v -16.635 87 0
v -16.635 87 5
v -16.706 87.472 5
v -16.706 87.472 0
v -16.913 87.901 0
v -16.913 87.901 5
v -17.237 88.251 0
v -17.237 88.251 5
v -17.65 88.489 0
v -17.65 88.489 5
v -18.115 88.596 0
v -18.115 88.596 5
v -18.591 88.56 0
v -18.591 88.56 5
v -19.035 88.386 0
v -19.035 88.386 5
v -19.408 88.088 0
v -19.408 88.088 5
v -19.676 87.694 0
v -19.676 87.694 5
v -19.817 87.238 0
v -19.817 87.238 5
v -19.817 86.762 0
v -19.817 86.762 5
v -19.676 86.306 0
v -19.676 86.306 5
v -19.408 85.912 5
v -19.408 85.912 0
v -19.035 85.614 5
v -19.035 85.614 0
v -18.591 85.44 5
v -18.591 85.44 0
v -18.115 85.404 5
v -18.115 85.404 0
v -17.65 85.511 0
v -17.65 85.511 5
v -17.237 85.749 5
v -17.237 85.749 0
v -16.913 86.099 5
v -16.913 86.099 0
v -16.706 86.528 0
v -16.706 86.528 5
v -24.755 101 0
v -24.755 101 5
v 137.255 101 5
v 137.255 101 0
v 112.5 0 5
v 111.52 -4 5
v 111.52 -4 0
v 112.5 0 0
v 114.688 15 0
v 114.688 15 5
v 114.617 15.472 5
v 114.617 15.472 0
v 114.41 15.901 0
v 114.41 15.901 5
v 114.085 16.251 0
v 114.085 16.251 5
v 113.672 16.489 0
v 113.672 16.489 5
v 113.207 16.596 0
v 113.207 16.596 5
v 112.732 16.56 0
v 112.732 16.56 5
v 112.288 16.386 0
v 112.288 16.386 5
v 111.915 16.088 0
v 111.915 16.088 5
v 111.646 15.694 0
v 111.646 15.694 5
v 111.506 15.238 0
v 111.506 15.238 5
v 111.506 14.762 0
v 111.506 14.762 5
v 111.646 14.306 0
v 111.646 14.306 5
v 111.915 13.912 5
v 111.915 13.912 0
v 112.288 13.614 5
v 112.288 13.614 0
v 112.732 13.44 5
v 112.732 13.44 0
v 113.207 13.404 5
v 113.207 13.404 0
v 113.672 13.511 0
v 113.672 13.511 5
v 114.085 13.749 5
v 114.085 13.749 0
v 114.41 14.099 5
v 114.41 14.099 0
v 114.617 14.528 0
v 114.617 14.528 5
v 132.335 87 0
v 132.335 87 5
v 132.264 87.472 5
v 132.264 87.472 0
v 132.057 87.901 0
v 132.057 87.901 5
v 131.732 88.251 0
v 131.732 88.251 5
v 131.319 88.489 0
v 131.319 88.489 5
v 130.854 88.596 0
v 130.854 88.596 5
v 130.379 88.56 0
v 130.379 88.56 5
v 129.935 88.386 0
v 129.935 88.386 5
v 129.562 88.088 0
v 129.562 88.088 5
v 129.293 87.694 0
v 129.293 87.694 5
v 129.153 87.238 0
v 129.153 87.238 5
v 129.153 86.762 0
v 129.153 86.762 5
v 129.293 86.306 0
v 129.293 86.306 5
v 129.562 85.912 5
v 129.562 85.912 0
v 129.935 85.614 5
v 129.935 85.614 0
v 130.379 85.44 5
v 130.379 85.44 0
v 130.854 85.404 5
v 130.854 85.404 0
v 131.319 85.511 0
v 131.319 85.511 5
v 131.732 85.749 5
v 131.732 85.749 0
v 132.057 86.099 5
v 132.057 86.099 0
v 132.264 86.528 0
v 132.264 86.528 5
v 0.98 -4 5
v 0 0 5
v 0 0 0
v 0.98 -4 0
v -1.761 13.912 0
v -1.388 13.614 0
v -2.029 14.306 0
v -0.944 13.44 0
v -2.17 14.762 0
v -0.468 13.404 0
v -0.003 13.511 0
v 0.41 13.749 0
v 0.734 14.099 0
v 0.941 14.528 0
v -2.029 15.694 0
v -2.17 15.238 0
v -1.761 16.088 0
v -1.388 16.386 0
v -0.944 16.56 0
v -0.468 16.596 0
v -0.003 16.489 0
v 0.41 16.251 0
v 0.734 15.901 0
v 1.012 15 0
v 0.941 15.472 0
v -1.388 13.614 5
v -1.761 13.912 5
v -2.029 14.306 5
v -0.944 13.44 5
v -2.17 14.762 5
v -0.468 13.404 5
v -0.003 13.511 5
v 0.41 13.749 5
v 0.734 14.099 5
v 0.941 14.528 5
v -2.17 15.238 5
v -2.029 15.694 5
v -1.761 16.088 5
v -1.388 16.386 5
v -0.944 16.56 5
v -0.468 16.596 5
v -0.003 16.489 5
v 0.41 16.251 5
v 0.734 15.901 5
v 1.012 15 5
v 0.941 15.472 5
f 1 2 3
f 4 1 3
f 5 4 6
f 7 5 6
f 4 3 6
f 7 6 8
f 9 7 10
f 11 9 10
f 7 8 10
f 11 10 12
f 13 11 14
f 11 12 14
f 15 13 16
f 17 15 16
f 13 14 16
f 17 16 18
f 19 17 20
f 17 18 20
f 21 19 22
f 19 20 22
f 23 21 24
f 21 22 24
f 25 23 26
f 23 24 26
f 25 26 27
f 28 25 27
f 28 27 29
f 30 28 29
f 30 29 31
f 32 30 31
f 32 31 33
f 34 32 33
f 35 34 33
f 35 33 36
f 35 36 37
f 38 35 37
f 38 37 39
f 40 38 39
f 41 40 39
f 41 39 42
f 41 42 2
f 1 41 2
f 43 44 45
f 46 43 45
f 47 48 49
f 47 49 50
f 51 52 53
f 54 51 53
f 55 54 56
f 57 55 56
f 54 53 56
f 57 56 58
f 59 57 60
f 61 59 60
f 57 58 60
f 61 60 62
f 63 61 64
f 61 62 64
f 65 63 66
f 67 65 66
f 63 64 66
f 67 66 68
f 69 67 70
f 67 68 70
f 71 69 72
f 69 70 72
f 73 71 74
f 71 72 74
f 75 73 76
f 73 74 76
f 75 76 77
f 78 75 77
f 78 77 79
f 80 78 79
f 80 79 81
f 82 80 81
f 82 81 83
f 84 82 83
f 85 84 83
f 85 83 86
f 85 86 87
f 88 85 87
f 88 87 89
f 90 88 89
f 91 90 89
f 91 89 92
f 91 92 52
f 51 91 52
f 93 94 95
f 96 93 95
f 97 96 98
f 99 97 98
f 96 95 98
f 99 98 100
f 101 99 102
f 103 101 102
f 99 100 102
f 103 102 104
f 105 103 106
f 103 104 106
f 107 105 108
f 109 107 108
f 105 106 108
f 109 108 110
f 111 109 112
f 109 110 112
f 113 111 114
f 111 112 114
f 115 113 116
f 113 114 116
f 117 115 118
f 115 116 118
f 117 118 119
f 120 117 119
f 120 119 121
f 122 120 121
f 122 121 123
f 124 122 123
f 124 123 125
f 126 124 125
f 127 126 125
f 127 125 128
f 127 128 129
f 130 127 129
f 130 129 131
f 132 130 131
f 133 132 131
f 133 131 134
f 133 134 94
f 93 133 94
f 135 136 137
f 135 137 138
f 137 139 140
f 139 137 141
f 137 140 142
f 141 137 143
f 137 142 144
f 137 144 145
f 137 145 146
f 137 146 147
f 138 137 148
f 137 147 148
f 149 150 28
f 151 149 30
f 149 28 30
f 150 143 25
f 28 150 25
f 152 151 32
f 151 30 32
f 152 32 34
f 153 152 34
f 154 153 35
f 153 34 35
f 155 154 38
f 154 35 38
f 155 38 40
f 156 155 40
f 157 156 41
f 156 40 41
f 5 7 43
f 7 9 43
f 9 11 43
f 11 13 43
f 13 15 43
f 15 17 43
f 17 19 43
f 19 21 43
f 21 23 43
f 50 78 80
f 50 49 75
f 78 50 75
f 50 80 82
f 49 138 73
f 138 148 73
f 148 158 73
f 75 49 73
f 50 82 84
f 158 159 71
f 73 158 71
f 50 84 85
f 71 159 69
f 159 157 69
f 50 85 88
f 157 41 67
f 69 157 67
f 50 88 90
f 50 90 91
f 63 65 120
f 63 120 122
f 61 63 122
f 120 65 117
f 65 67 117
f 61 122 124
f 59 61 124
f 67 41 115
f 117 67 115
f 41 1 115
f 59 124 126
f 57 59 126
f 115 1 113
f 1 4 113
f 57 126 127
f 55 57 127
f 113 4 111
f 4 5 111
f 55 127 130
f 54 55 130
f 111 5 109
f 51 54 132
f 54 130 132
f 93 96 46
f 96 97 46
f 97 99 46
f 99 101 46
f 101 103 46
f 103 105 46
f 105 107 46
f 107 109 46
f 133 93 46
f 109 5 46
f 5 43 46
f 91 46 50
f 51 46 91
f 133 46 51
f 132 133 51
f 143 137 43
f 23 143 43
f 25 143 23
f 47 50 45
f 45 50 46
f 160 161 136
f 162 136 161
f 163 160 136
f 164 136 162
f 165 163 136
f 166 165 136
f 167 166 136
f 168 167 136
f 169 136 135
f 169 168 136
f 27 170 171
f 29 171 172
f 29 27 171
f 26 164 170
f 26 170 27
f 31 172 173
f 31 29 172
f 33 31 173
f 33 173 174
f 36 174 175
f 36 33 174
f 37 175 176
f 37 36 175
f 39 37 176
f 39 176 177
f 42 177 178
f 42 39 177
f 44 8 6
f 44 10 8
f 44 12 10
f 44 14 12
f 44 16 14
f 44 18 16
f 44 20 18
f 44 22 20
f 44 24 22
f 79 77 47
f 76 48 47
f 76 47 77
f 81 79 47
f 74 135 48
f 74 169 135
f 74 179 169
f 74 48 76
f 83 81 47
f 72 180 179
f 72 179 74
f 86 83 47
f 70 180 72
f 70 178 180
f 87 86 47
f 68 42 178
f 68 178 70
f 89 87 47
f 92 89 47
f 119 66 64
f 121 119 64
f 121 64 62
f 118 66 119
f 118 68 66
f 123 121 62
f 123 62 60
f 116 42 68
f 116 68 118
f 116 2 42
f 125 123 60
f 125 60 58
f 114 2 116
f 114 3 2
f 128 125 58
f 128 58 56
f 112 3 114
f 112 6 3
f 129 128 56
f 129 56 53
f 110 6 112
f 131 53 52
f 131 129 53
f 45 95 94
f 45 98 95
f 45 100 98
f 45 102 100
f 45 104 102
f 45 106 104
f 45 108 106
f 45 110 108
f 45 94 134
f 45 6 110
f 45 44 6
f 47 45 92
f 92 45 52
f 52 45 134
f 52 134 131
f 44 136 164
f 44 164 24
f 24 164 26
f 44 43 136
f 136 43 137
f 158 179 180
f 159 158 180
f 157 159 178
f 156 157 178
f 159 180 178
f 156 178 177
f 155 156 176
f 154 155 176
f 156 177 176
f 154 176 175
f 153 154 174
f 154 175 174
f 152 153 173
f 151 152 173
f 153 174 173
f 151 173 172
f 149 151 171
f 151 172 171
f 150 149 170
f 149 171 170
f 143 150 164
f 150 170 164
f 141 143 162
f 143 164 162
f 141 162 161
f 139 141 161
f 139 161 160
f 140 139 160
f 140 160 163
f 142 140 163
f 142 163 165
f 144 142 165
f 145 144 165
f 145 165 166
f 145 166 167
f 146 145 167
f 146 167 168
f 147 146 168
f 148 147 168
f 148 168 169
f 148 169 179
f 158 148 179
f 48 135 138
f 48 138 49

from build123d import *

# Parameters (mm, degrees)
EXTRUDE_2_DEPTH     = 5
SKETCH_3_R          = 1.6
CUT_EXTRUDE_1_DEPTH = 172.275363085
SKETCH_4_W          = 164.707045146
SKETCH_4_H          = 1
CUT_EXTRUDE_2_DEPTH = 172.275363085
EXTRUDE_3_DEPTH     = 5


with BuildPart() as part:
    # 草图2 → 凸台-拉伸2 (new body)
    with BuildSketch(Plane.XY):
        Polygon((0, 0), (112.5, 0), (137.5, 102), (-25, 102), align=None)
    extrude(amount=EXTRUDE_2_DEPTH)

    # 草图3 → 切除-拉伸1 (cut, through all)
    with BuildSketch(Plane.XY.offset(5)):
        with Locations((-18.234733944, 87)):
            Circle(SKETCH_3_R)
        with Locations((113.087675121, 15)):
            Circle(SKETCH_3_R)
        with Locations((-0.587675121, 15)):
            Circle(SKETCH_3_R)
        with Locations((130.734733944, 87)):
            Circle(SKETCH_3_R)
    extrude(amount=-CUT_EXTRUDE_1_DEPTH, mode=Mode.SUBTRACT)

    # 草图4 → 切除-拉伸2 (cut, through all)
    with BuildSketch(Plane.XY.offset(5)):
        with Locations((57.353522573, 101.5)):
            Rectangle(SKETCH_4_W, SKETCH_4_H)
    extrude(amount=-CUT_EXTRUDE_2_DEPTH, mode=Mode.SUBTRACT)

    # 草图5 → 凸台-拉伸3 (add)
    with BuildSketch(Plane.XY.offset(5)):
        Polygon((0, 0), (0.980392157, -4), (111.519607843, -4), (112.5, 0), align=None)
    extrude(amount=-EXTRUDE_3_DEPTH)


solid = part.part
